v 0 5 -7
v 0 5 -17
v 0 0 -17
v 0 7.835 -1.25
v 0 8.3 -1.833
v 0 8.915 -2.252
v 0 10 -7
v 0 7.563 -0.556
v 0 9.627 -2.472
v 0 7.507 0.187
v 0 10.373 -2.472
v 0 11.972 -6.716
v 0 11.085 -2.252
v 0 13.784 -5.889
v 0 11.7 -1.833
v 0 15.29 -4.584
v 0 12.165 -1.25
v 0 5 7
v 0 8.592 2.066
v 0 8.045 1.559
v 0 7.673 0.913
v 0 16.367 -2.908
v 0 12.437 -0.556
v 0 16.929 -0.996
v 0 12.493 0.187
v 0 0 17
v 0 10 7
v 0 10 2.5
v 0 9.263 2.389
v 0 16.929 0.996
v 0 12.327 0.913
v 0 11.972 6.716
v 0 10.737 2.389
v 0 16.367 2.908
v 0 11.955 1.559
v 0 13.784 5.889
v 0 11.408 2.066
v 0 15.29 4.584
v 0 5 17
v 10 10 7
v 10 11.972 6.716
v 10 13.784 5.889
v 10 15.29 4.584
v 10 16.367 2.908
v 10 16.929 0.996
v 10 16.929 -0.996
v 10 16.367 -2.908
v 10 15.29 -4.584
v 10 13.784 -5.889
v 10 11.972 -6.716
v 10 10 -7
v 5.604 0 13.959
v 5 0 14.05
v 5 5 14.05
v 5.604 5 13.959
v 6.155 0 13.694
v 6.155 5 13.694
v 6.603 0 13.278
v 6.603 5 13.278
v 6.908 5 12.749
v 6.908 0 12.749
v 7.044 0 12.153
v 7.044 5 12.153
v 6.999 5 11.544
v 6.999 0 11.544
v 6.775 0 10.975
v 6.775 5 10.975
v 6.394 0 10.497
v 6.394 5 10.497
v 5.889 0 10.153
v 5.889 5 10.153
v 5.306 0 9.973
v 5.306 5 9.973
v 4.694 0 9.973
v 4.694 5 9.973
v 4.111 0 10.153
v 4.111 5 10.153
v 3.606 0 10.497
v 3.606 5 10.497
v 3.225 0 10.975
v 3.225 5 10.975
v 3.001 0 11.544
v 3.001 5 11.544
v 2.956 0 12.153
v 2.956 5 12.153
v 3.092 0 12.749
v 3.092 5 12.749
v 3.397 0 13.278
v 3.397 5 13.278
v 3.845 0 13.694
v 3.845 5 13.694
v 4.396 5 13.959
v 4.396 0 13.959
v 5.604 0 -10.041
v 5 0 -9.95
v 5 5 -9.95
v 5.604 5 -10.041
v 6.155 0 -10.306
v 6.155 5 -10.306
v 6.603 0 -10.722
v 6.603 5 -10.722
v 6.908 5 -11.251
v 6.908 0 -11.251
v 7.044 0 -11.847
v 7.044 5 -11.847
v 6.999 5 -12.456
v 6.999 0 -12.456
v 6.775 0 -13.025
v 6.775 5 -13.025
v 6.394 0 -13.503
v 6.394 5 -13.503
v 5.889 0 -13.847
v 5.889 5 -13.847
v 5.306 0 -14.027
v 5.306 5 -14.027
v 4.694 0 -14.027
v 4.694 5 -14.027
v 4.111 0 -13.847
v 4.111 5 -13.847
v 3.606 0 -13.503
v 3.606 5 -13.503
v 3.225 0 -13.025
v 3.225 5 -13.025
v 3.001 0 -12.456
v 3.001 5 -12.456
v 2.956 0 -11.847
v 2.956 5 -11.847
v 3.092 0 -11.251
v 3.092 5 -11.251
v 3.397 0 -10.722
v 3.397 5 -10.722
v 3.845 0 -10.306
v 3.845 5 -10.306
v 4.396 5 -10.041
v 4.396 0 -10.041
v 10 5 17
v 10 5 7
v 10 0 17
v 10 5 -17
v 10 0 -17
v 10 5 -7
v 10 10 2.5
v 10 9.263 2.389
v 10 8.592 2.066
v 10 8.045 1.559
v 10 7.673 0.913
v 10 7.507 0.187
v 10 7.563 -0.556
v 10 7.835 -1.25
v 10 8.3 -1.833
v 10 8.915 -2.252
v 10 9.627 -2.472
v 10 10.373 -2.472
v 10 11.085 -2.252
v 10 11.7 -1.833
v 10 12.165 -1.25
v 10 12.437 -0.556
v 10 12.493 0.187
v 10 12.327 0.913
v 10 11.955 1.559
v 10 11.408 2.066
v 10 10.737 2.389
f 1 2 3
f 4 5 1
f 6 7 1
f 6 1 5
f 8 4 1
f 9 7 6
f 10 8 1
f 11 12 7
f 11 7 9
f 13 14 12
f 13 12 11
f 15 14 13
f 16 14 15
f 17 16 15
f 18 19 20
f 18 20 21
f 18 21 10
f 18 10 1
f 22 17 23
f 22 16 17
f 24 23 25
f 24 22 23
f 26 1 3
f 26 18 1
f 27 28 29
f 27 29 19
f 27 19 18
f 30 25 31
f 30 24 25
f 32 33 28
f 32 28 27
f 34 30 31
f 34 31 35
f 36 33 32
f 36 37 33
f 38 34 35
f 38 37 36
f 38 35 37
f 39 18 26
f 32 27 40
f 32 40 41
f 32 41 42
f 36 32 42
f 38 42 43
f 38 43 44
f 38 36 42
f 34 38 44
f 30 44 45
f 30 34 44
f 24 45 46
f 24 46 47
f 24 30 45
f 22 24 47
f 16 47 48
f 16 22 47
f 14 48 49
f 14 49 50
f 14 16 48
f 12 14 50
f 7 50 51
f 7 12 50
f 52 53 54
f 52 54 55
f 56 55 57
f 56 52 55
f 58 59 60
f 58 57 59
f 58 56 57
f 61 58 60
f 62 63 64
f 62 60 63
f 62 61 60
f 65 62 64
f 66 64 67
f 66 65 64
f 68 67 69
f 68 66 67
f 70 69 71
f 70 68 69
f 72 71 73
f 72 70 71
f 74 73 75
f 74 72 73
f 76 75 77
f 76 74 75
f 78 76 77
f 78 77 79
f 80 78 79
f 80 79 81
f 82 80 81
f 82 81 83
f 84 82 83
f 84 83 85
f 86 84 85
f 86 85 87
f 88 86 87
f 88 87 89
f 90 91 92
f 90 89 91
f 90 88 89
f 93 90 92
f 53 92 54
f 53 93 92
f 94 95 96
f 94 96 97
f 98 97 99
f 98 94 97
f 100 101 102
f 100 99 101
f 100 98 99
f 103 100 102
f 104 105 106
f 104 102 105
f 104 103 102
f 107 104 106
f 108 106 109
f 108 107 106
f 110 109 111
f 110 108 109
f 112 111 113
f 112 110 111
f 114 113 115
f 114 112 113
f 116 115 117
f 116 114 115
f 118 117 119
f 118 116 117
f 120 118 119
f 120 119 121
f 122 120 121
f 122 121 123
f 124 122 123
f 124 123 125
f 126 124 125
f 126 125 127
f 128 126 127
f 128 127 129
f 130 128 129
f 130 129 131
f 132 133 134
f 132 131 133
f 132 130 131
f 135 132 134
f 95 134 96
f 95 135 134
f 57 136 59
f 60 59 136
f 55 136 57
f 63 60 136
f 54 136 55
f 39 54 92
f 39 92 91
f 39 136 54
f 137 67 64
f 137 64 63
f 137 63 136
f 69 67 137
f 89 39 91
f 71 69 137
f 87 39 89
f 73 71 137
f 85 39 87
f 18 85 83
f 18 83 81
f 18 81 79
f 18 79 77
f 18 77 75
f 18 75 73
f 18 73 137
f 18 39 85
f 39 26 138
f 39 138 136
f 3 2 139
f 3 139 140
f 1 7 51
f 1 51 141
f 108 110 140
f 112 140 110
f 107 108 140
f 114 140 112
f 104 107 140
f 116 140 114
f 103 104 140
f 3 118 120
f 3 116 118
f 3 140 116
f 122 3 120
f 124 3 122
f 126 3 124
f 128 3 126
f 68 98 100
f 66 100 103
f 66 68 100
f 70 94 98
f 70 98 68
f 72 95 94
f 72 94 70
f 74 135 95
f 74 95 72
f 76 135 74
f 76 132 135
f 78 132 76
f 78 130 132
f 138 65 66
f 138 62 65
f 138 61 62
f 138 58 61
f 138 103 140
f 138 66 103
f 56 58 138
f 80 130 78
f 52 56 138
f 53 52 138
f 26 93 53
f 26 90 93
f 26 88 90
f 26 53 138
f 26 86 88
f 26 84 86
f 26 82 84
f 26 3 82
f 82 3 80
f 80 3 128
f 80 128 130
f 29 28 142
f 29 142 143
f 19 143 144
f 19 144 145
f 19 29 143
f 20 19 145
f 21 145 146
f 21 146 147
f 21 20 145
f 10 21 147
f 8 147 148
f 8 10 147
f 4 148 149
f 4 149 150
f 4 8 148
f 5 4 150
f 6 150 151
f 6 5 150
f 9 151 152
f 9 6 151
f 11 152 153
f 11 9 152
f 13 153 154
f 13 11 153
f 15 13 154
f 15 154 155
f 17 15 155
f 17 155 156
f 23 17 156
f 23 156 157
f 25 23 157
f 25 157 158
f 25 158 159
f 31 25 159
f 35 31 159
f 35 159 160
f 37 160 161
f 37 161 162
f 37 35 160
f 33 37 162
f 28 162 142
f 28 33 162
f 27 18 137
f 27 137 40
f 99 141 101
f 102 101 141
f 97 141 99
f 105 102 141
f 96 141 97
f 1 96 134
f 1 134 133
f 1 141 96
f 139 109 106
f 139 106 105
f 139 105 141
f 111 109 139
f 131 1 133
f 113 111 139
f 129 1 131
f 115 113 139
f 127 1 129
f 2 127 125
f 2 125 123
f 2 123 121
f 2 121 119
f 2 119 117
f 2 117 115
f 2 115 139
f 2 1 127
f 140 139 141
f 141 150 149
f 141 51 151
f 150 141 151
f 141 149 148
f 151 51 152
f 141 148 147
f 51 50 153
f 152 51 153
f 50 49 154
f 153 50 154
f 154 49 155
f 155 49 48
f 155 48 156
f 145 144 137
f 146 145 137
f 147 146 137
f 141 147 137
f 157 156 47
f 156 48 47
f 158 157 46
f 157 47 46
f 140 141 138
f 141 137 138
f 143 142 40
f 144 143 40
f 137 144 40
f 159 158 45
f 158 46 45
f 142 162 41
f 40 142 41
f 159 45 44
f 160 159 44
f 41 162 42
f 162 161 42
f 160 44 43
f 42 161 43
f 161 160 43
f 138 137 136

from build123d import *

# Parameters (mm, degrees)
ESQUISSE1_R                  = 2.5
BOSS_EXTRU_1_DEPTH           = 10
ENL_V_MAT_EXTRU_1_DEPTH      = 24.086792761
ENL_V_MAT_EXTRU_1_DEPTH_BACK = 24.086792761
ESQUISSE2_R                  = 2.05


with BuildPart() as part:
    # Esquisse1 → Boss.-Extru.1 (new body)
    with BuildSketch(Plane(origin=(0, 0, 0), x_dir=(0, 0, -1), z_dir=(1, 0, 0))):
        with BuildLine():
            Line((17, 0), (-17, 0))
            Line((-17, 0), (-17, 5))
            Line((-17, 5), (-7, 5))
            Line((-7, 5), (-7, 10))
            ThreePointArc((-7, 10), (0, 17), (7, 10))
            Line((7, 10), (7, 5))
            Line((7, 5), (17, 5))
            Line((17, 5), (17, 0))
        make_face()
        with Locations(Location((0, 10, 0), (0, 0, 180))):
            Circle(ESQUISSE1_R, mode=Mode.SUBTRACT)
    extrude(amount=BOSS_EXTRU_1_DEPTH)

    # Esquisse2 → Enlèv. mat.-Extru.1 (cut, two sides: drawn at the far end of the back side and taken through both)
    with BuildSketch(Plane(origin=(0, 5, 0), x_dir=(1, 0, 0), z_dir=(0, 1, 0)).offset(-ENL_V_MAT_EXTRU_1_DEPTH_BACK)):
        with Locations(Location((5, 12, 0), (0, 0, 270))):
            Circle(ESQUISSE2_R)
        with Locations(Location((5, -12, 0), (0, 0, 270))):
            Circle(ESQUISSE2_R)
    extrude(amount=ENL_V_MAT_EXTRU_1_DEPTH + ENL_V_MAT_EXTRU_1_DEPTH_BACK, mode=Mode.SUBTRACT)


solid = part.part
